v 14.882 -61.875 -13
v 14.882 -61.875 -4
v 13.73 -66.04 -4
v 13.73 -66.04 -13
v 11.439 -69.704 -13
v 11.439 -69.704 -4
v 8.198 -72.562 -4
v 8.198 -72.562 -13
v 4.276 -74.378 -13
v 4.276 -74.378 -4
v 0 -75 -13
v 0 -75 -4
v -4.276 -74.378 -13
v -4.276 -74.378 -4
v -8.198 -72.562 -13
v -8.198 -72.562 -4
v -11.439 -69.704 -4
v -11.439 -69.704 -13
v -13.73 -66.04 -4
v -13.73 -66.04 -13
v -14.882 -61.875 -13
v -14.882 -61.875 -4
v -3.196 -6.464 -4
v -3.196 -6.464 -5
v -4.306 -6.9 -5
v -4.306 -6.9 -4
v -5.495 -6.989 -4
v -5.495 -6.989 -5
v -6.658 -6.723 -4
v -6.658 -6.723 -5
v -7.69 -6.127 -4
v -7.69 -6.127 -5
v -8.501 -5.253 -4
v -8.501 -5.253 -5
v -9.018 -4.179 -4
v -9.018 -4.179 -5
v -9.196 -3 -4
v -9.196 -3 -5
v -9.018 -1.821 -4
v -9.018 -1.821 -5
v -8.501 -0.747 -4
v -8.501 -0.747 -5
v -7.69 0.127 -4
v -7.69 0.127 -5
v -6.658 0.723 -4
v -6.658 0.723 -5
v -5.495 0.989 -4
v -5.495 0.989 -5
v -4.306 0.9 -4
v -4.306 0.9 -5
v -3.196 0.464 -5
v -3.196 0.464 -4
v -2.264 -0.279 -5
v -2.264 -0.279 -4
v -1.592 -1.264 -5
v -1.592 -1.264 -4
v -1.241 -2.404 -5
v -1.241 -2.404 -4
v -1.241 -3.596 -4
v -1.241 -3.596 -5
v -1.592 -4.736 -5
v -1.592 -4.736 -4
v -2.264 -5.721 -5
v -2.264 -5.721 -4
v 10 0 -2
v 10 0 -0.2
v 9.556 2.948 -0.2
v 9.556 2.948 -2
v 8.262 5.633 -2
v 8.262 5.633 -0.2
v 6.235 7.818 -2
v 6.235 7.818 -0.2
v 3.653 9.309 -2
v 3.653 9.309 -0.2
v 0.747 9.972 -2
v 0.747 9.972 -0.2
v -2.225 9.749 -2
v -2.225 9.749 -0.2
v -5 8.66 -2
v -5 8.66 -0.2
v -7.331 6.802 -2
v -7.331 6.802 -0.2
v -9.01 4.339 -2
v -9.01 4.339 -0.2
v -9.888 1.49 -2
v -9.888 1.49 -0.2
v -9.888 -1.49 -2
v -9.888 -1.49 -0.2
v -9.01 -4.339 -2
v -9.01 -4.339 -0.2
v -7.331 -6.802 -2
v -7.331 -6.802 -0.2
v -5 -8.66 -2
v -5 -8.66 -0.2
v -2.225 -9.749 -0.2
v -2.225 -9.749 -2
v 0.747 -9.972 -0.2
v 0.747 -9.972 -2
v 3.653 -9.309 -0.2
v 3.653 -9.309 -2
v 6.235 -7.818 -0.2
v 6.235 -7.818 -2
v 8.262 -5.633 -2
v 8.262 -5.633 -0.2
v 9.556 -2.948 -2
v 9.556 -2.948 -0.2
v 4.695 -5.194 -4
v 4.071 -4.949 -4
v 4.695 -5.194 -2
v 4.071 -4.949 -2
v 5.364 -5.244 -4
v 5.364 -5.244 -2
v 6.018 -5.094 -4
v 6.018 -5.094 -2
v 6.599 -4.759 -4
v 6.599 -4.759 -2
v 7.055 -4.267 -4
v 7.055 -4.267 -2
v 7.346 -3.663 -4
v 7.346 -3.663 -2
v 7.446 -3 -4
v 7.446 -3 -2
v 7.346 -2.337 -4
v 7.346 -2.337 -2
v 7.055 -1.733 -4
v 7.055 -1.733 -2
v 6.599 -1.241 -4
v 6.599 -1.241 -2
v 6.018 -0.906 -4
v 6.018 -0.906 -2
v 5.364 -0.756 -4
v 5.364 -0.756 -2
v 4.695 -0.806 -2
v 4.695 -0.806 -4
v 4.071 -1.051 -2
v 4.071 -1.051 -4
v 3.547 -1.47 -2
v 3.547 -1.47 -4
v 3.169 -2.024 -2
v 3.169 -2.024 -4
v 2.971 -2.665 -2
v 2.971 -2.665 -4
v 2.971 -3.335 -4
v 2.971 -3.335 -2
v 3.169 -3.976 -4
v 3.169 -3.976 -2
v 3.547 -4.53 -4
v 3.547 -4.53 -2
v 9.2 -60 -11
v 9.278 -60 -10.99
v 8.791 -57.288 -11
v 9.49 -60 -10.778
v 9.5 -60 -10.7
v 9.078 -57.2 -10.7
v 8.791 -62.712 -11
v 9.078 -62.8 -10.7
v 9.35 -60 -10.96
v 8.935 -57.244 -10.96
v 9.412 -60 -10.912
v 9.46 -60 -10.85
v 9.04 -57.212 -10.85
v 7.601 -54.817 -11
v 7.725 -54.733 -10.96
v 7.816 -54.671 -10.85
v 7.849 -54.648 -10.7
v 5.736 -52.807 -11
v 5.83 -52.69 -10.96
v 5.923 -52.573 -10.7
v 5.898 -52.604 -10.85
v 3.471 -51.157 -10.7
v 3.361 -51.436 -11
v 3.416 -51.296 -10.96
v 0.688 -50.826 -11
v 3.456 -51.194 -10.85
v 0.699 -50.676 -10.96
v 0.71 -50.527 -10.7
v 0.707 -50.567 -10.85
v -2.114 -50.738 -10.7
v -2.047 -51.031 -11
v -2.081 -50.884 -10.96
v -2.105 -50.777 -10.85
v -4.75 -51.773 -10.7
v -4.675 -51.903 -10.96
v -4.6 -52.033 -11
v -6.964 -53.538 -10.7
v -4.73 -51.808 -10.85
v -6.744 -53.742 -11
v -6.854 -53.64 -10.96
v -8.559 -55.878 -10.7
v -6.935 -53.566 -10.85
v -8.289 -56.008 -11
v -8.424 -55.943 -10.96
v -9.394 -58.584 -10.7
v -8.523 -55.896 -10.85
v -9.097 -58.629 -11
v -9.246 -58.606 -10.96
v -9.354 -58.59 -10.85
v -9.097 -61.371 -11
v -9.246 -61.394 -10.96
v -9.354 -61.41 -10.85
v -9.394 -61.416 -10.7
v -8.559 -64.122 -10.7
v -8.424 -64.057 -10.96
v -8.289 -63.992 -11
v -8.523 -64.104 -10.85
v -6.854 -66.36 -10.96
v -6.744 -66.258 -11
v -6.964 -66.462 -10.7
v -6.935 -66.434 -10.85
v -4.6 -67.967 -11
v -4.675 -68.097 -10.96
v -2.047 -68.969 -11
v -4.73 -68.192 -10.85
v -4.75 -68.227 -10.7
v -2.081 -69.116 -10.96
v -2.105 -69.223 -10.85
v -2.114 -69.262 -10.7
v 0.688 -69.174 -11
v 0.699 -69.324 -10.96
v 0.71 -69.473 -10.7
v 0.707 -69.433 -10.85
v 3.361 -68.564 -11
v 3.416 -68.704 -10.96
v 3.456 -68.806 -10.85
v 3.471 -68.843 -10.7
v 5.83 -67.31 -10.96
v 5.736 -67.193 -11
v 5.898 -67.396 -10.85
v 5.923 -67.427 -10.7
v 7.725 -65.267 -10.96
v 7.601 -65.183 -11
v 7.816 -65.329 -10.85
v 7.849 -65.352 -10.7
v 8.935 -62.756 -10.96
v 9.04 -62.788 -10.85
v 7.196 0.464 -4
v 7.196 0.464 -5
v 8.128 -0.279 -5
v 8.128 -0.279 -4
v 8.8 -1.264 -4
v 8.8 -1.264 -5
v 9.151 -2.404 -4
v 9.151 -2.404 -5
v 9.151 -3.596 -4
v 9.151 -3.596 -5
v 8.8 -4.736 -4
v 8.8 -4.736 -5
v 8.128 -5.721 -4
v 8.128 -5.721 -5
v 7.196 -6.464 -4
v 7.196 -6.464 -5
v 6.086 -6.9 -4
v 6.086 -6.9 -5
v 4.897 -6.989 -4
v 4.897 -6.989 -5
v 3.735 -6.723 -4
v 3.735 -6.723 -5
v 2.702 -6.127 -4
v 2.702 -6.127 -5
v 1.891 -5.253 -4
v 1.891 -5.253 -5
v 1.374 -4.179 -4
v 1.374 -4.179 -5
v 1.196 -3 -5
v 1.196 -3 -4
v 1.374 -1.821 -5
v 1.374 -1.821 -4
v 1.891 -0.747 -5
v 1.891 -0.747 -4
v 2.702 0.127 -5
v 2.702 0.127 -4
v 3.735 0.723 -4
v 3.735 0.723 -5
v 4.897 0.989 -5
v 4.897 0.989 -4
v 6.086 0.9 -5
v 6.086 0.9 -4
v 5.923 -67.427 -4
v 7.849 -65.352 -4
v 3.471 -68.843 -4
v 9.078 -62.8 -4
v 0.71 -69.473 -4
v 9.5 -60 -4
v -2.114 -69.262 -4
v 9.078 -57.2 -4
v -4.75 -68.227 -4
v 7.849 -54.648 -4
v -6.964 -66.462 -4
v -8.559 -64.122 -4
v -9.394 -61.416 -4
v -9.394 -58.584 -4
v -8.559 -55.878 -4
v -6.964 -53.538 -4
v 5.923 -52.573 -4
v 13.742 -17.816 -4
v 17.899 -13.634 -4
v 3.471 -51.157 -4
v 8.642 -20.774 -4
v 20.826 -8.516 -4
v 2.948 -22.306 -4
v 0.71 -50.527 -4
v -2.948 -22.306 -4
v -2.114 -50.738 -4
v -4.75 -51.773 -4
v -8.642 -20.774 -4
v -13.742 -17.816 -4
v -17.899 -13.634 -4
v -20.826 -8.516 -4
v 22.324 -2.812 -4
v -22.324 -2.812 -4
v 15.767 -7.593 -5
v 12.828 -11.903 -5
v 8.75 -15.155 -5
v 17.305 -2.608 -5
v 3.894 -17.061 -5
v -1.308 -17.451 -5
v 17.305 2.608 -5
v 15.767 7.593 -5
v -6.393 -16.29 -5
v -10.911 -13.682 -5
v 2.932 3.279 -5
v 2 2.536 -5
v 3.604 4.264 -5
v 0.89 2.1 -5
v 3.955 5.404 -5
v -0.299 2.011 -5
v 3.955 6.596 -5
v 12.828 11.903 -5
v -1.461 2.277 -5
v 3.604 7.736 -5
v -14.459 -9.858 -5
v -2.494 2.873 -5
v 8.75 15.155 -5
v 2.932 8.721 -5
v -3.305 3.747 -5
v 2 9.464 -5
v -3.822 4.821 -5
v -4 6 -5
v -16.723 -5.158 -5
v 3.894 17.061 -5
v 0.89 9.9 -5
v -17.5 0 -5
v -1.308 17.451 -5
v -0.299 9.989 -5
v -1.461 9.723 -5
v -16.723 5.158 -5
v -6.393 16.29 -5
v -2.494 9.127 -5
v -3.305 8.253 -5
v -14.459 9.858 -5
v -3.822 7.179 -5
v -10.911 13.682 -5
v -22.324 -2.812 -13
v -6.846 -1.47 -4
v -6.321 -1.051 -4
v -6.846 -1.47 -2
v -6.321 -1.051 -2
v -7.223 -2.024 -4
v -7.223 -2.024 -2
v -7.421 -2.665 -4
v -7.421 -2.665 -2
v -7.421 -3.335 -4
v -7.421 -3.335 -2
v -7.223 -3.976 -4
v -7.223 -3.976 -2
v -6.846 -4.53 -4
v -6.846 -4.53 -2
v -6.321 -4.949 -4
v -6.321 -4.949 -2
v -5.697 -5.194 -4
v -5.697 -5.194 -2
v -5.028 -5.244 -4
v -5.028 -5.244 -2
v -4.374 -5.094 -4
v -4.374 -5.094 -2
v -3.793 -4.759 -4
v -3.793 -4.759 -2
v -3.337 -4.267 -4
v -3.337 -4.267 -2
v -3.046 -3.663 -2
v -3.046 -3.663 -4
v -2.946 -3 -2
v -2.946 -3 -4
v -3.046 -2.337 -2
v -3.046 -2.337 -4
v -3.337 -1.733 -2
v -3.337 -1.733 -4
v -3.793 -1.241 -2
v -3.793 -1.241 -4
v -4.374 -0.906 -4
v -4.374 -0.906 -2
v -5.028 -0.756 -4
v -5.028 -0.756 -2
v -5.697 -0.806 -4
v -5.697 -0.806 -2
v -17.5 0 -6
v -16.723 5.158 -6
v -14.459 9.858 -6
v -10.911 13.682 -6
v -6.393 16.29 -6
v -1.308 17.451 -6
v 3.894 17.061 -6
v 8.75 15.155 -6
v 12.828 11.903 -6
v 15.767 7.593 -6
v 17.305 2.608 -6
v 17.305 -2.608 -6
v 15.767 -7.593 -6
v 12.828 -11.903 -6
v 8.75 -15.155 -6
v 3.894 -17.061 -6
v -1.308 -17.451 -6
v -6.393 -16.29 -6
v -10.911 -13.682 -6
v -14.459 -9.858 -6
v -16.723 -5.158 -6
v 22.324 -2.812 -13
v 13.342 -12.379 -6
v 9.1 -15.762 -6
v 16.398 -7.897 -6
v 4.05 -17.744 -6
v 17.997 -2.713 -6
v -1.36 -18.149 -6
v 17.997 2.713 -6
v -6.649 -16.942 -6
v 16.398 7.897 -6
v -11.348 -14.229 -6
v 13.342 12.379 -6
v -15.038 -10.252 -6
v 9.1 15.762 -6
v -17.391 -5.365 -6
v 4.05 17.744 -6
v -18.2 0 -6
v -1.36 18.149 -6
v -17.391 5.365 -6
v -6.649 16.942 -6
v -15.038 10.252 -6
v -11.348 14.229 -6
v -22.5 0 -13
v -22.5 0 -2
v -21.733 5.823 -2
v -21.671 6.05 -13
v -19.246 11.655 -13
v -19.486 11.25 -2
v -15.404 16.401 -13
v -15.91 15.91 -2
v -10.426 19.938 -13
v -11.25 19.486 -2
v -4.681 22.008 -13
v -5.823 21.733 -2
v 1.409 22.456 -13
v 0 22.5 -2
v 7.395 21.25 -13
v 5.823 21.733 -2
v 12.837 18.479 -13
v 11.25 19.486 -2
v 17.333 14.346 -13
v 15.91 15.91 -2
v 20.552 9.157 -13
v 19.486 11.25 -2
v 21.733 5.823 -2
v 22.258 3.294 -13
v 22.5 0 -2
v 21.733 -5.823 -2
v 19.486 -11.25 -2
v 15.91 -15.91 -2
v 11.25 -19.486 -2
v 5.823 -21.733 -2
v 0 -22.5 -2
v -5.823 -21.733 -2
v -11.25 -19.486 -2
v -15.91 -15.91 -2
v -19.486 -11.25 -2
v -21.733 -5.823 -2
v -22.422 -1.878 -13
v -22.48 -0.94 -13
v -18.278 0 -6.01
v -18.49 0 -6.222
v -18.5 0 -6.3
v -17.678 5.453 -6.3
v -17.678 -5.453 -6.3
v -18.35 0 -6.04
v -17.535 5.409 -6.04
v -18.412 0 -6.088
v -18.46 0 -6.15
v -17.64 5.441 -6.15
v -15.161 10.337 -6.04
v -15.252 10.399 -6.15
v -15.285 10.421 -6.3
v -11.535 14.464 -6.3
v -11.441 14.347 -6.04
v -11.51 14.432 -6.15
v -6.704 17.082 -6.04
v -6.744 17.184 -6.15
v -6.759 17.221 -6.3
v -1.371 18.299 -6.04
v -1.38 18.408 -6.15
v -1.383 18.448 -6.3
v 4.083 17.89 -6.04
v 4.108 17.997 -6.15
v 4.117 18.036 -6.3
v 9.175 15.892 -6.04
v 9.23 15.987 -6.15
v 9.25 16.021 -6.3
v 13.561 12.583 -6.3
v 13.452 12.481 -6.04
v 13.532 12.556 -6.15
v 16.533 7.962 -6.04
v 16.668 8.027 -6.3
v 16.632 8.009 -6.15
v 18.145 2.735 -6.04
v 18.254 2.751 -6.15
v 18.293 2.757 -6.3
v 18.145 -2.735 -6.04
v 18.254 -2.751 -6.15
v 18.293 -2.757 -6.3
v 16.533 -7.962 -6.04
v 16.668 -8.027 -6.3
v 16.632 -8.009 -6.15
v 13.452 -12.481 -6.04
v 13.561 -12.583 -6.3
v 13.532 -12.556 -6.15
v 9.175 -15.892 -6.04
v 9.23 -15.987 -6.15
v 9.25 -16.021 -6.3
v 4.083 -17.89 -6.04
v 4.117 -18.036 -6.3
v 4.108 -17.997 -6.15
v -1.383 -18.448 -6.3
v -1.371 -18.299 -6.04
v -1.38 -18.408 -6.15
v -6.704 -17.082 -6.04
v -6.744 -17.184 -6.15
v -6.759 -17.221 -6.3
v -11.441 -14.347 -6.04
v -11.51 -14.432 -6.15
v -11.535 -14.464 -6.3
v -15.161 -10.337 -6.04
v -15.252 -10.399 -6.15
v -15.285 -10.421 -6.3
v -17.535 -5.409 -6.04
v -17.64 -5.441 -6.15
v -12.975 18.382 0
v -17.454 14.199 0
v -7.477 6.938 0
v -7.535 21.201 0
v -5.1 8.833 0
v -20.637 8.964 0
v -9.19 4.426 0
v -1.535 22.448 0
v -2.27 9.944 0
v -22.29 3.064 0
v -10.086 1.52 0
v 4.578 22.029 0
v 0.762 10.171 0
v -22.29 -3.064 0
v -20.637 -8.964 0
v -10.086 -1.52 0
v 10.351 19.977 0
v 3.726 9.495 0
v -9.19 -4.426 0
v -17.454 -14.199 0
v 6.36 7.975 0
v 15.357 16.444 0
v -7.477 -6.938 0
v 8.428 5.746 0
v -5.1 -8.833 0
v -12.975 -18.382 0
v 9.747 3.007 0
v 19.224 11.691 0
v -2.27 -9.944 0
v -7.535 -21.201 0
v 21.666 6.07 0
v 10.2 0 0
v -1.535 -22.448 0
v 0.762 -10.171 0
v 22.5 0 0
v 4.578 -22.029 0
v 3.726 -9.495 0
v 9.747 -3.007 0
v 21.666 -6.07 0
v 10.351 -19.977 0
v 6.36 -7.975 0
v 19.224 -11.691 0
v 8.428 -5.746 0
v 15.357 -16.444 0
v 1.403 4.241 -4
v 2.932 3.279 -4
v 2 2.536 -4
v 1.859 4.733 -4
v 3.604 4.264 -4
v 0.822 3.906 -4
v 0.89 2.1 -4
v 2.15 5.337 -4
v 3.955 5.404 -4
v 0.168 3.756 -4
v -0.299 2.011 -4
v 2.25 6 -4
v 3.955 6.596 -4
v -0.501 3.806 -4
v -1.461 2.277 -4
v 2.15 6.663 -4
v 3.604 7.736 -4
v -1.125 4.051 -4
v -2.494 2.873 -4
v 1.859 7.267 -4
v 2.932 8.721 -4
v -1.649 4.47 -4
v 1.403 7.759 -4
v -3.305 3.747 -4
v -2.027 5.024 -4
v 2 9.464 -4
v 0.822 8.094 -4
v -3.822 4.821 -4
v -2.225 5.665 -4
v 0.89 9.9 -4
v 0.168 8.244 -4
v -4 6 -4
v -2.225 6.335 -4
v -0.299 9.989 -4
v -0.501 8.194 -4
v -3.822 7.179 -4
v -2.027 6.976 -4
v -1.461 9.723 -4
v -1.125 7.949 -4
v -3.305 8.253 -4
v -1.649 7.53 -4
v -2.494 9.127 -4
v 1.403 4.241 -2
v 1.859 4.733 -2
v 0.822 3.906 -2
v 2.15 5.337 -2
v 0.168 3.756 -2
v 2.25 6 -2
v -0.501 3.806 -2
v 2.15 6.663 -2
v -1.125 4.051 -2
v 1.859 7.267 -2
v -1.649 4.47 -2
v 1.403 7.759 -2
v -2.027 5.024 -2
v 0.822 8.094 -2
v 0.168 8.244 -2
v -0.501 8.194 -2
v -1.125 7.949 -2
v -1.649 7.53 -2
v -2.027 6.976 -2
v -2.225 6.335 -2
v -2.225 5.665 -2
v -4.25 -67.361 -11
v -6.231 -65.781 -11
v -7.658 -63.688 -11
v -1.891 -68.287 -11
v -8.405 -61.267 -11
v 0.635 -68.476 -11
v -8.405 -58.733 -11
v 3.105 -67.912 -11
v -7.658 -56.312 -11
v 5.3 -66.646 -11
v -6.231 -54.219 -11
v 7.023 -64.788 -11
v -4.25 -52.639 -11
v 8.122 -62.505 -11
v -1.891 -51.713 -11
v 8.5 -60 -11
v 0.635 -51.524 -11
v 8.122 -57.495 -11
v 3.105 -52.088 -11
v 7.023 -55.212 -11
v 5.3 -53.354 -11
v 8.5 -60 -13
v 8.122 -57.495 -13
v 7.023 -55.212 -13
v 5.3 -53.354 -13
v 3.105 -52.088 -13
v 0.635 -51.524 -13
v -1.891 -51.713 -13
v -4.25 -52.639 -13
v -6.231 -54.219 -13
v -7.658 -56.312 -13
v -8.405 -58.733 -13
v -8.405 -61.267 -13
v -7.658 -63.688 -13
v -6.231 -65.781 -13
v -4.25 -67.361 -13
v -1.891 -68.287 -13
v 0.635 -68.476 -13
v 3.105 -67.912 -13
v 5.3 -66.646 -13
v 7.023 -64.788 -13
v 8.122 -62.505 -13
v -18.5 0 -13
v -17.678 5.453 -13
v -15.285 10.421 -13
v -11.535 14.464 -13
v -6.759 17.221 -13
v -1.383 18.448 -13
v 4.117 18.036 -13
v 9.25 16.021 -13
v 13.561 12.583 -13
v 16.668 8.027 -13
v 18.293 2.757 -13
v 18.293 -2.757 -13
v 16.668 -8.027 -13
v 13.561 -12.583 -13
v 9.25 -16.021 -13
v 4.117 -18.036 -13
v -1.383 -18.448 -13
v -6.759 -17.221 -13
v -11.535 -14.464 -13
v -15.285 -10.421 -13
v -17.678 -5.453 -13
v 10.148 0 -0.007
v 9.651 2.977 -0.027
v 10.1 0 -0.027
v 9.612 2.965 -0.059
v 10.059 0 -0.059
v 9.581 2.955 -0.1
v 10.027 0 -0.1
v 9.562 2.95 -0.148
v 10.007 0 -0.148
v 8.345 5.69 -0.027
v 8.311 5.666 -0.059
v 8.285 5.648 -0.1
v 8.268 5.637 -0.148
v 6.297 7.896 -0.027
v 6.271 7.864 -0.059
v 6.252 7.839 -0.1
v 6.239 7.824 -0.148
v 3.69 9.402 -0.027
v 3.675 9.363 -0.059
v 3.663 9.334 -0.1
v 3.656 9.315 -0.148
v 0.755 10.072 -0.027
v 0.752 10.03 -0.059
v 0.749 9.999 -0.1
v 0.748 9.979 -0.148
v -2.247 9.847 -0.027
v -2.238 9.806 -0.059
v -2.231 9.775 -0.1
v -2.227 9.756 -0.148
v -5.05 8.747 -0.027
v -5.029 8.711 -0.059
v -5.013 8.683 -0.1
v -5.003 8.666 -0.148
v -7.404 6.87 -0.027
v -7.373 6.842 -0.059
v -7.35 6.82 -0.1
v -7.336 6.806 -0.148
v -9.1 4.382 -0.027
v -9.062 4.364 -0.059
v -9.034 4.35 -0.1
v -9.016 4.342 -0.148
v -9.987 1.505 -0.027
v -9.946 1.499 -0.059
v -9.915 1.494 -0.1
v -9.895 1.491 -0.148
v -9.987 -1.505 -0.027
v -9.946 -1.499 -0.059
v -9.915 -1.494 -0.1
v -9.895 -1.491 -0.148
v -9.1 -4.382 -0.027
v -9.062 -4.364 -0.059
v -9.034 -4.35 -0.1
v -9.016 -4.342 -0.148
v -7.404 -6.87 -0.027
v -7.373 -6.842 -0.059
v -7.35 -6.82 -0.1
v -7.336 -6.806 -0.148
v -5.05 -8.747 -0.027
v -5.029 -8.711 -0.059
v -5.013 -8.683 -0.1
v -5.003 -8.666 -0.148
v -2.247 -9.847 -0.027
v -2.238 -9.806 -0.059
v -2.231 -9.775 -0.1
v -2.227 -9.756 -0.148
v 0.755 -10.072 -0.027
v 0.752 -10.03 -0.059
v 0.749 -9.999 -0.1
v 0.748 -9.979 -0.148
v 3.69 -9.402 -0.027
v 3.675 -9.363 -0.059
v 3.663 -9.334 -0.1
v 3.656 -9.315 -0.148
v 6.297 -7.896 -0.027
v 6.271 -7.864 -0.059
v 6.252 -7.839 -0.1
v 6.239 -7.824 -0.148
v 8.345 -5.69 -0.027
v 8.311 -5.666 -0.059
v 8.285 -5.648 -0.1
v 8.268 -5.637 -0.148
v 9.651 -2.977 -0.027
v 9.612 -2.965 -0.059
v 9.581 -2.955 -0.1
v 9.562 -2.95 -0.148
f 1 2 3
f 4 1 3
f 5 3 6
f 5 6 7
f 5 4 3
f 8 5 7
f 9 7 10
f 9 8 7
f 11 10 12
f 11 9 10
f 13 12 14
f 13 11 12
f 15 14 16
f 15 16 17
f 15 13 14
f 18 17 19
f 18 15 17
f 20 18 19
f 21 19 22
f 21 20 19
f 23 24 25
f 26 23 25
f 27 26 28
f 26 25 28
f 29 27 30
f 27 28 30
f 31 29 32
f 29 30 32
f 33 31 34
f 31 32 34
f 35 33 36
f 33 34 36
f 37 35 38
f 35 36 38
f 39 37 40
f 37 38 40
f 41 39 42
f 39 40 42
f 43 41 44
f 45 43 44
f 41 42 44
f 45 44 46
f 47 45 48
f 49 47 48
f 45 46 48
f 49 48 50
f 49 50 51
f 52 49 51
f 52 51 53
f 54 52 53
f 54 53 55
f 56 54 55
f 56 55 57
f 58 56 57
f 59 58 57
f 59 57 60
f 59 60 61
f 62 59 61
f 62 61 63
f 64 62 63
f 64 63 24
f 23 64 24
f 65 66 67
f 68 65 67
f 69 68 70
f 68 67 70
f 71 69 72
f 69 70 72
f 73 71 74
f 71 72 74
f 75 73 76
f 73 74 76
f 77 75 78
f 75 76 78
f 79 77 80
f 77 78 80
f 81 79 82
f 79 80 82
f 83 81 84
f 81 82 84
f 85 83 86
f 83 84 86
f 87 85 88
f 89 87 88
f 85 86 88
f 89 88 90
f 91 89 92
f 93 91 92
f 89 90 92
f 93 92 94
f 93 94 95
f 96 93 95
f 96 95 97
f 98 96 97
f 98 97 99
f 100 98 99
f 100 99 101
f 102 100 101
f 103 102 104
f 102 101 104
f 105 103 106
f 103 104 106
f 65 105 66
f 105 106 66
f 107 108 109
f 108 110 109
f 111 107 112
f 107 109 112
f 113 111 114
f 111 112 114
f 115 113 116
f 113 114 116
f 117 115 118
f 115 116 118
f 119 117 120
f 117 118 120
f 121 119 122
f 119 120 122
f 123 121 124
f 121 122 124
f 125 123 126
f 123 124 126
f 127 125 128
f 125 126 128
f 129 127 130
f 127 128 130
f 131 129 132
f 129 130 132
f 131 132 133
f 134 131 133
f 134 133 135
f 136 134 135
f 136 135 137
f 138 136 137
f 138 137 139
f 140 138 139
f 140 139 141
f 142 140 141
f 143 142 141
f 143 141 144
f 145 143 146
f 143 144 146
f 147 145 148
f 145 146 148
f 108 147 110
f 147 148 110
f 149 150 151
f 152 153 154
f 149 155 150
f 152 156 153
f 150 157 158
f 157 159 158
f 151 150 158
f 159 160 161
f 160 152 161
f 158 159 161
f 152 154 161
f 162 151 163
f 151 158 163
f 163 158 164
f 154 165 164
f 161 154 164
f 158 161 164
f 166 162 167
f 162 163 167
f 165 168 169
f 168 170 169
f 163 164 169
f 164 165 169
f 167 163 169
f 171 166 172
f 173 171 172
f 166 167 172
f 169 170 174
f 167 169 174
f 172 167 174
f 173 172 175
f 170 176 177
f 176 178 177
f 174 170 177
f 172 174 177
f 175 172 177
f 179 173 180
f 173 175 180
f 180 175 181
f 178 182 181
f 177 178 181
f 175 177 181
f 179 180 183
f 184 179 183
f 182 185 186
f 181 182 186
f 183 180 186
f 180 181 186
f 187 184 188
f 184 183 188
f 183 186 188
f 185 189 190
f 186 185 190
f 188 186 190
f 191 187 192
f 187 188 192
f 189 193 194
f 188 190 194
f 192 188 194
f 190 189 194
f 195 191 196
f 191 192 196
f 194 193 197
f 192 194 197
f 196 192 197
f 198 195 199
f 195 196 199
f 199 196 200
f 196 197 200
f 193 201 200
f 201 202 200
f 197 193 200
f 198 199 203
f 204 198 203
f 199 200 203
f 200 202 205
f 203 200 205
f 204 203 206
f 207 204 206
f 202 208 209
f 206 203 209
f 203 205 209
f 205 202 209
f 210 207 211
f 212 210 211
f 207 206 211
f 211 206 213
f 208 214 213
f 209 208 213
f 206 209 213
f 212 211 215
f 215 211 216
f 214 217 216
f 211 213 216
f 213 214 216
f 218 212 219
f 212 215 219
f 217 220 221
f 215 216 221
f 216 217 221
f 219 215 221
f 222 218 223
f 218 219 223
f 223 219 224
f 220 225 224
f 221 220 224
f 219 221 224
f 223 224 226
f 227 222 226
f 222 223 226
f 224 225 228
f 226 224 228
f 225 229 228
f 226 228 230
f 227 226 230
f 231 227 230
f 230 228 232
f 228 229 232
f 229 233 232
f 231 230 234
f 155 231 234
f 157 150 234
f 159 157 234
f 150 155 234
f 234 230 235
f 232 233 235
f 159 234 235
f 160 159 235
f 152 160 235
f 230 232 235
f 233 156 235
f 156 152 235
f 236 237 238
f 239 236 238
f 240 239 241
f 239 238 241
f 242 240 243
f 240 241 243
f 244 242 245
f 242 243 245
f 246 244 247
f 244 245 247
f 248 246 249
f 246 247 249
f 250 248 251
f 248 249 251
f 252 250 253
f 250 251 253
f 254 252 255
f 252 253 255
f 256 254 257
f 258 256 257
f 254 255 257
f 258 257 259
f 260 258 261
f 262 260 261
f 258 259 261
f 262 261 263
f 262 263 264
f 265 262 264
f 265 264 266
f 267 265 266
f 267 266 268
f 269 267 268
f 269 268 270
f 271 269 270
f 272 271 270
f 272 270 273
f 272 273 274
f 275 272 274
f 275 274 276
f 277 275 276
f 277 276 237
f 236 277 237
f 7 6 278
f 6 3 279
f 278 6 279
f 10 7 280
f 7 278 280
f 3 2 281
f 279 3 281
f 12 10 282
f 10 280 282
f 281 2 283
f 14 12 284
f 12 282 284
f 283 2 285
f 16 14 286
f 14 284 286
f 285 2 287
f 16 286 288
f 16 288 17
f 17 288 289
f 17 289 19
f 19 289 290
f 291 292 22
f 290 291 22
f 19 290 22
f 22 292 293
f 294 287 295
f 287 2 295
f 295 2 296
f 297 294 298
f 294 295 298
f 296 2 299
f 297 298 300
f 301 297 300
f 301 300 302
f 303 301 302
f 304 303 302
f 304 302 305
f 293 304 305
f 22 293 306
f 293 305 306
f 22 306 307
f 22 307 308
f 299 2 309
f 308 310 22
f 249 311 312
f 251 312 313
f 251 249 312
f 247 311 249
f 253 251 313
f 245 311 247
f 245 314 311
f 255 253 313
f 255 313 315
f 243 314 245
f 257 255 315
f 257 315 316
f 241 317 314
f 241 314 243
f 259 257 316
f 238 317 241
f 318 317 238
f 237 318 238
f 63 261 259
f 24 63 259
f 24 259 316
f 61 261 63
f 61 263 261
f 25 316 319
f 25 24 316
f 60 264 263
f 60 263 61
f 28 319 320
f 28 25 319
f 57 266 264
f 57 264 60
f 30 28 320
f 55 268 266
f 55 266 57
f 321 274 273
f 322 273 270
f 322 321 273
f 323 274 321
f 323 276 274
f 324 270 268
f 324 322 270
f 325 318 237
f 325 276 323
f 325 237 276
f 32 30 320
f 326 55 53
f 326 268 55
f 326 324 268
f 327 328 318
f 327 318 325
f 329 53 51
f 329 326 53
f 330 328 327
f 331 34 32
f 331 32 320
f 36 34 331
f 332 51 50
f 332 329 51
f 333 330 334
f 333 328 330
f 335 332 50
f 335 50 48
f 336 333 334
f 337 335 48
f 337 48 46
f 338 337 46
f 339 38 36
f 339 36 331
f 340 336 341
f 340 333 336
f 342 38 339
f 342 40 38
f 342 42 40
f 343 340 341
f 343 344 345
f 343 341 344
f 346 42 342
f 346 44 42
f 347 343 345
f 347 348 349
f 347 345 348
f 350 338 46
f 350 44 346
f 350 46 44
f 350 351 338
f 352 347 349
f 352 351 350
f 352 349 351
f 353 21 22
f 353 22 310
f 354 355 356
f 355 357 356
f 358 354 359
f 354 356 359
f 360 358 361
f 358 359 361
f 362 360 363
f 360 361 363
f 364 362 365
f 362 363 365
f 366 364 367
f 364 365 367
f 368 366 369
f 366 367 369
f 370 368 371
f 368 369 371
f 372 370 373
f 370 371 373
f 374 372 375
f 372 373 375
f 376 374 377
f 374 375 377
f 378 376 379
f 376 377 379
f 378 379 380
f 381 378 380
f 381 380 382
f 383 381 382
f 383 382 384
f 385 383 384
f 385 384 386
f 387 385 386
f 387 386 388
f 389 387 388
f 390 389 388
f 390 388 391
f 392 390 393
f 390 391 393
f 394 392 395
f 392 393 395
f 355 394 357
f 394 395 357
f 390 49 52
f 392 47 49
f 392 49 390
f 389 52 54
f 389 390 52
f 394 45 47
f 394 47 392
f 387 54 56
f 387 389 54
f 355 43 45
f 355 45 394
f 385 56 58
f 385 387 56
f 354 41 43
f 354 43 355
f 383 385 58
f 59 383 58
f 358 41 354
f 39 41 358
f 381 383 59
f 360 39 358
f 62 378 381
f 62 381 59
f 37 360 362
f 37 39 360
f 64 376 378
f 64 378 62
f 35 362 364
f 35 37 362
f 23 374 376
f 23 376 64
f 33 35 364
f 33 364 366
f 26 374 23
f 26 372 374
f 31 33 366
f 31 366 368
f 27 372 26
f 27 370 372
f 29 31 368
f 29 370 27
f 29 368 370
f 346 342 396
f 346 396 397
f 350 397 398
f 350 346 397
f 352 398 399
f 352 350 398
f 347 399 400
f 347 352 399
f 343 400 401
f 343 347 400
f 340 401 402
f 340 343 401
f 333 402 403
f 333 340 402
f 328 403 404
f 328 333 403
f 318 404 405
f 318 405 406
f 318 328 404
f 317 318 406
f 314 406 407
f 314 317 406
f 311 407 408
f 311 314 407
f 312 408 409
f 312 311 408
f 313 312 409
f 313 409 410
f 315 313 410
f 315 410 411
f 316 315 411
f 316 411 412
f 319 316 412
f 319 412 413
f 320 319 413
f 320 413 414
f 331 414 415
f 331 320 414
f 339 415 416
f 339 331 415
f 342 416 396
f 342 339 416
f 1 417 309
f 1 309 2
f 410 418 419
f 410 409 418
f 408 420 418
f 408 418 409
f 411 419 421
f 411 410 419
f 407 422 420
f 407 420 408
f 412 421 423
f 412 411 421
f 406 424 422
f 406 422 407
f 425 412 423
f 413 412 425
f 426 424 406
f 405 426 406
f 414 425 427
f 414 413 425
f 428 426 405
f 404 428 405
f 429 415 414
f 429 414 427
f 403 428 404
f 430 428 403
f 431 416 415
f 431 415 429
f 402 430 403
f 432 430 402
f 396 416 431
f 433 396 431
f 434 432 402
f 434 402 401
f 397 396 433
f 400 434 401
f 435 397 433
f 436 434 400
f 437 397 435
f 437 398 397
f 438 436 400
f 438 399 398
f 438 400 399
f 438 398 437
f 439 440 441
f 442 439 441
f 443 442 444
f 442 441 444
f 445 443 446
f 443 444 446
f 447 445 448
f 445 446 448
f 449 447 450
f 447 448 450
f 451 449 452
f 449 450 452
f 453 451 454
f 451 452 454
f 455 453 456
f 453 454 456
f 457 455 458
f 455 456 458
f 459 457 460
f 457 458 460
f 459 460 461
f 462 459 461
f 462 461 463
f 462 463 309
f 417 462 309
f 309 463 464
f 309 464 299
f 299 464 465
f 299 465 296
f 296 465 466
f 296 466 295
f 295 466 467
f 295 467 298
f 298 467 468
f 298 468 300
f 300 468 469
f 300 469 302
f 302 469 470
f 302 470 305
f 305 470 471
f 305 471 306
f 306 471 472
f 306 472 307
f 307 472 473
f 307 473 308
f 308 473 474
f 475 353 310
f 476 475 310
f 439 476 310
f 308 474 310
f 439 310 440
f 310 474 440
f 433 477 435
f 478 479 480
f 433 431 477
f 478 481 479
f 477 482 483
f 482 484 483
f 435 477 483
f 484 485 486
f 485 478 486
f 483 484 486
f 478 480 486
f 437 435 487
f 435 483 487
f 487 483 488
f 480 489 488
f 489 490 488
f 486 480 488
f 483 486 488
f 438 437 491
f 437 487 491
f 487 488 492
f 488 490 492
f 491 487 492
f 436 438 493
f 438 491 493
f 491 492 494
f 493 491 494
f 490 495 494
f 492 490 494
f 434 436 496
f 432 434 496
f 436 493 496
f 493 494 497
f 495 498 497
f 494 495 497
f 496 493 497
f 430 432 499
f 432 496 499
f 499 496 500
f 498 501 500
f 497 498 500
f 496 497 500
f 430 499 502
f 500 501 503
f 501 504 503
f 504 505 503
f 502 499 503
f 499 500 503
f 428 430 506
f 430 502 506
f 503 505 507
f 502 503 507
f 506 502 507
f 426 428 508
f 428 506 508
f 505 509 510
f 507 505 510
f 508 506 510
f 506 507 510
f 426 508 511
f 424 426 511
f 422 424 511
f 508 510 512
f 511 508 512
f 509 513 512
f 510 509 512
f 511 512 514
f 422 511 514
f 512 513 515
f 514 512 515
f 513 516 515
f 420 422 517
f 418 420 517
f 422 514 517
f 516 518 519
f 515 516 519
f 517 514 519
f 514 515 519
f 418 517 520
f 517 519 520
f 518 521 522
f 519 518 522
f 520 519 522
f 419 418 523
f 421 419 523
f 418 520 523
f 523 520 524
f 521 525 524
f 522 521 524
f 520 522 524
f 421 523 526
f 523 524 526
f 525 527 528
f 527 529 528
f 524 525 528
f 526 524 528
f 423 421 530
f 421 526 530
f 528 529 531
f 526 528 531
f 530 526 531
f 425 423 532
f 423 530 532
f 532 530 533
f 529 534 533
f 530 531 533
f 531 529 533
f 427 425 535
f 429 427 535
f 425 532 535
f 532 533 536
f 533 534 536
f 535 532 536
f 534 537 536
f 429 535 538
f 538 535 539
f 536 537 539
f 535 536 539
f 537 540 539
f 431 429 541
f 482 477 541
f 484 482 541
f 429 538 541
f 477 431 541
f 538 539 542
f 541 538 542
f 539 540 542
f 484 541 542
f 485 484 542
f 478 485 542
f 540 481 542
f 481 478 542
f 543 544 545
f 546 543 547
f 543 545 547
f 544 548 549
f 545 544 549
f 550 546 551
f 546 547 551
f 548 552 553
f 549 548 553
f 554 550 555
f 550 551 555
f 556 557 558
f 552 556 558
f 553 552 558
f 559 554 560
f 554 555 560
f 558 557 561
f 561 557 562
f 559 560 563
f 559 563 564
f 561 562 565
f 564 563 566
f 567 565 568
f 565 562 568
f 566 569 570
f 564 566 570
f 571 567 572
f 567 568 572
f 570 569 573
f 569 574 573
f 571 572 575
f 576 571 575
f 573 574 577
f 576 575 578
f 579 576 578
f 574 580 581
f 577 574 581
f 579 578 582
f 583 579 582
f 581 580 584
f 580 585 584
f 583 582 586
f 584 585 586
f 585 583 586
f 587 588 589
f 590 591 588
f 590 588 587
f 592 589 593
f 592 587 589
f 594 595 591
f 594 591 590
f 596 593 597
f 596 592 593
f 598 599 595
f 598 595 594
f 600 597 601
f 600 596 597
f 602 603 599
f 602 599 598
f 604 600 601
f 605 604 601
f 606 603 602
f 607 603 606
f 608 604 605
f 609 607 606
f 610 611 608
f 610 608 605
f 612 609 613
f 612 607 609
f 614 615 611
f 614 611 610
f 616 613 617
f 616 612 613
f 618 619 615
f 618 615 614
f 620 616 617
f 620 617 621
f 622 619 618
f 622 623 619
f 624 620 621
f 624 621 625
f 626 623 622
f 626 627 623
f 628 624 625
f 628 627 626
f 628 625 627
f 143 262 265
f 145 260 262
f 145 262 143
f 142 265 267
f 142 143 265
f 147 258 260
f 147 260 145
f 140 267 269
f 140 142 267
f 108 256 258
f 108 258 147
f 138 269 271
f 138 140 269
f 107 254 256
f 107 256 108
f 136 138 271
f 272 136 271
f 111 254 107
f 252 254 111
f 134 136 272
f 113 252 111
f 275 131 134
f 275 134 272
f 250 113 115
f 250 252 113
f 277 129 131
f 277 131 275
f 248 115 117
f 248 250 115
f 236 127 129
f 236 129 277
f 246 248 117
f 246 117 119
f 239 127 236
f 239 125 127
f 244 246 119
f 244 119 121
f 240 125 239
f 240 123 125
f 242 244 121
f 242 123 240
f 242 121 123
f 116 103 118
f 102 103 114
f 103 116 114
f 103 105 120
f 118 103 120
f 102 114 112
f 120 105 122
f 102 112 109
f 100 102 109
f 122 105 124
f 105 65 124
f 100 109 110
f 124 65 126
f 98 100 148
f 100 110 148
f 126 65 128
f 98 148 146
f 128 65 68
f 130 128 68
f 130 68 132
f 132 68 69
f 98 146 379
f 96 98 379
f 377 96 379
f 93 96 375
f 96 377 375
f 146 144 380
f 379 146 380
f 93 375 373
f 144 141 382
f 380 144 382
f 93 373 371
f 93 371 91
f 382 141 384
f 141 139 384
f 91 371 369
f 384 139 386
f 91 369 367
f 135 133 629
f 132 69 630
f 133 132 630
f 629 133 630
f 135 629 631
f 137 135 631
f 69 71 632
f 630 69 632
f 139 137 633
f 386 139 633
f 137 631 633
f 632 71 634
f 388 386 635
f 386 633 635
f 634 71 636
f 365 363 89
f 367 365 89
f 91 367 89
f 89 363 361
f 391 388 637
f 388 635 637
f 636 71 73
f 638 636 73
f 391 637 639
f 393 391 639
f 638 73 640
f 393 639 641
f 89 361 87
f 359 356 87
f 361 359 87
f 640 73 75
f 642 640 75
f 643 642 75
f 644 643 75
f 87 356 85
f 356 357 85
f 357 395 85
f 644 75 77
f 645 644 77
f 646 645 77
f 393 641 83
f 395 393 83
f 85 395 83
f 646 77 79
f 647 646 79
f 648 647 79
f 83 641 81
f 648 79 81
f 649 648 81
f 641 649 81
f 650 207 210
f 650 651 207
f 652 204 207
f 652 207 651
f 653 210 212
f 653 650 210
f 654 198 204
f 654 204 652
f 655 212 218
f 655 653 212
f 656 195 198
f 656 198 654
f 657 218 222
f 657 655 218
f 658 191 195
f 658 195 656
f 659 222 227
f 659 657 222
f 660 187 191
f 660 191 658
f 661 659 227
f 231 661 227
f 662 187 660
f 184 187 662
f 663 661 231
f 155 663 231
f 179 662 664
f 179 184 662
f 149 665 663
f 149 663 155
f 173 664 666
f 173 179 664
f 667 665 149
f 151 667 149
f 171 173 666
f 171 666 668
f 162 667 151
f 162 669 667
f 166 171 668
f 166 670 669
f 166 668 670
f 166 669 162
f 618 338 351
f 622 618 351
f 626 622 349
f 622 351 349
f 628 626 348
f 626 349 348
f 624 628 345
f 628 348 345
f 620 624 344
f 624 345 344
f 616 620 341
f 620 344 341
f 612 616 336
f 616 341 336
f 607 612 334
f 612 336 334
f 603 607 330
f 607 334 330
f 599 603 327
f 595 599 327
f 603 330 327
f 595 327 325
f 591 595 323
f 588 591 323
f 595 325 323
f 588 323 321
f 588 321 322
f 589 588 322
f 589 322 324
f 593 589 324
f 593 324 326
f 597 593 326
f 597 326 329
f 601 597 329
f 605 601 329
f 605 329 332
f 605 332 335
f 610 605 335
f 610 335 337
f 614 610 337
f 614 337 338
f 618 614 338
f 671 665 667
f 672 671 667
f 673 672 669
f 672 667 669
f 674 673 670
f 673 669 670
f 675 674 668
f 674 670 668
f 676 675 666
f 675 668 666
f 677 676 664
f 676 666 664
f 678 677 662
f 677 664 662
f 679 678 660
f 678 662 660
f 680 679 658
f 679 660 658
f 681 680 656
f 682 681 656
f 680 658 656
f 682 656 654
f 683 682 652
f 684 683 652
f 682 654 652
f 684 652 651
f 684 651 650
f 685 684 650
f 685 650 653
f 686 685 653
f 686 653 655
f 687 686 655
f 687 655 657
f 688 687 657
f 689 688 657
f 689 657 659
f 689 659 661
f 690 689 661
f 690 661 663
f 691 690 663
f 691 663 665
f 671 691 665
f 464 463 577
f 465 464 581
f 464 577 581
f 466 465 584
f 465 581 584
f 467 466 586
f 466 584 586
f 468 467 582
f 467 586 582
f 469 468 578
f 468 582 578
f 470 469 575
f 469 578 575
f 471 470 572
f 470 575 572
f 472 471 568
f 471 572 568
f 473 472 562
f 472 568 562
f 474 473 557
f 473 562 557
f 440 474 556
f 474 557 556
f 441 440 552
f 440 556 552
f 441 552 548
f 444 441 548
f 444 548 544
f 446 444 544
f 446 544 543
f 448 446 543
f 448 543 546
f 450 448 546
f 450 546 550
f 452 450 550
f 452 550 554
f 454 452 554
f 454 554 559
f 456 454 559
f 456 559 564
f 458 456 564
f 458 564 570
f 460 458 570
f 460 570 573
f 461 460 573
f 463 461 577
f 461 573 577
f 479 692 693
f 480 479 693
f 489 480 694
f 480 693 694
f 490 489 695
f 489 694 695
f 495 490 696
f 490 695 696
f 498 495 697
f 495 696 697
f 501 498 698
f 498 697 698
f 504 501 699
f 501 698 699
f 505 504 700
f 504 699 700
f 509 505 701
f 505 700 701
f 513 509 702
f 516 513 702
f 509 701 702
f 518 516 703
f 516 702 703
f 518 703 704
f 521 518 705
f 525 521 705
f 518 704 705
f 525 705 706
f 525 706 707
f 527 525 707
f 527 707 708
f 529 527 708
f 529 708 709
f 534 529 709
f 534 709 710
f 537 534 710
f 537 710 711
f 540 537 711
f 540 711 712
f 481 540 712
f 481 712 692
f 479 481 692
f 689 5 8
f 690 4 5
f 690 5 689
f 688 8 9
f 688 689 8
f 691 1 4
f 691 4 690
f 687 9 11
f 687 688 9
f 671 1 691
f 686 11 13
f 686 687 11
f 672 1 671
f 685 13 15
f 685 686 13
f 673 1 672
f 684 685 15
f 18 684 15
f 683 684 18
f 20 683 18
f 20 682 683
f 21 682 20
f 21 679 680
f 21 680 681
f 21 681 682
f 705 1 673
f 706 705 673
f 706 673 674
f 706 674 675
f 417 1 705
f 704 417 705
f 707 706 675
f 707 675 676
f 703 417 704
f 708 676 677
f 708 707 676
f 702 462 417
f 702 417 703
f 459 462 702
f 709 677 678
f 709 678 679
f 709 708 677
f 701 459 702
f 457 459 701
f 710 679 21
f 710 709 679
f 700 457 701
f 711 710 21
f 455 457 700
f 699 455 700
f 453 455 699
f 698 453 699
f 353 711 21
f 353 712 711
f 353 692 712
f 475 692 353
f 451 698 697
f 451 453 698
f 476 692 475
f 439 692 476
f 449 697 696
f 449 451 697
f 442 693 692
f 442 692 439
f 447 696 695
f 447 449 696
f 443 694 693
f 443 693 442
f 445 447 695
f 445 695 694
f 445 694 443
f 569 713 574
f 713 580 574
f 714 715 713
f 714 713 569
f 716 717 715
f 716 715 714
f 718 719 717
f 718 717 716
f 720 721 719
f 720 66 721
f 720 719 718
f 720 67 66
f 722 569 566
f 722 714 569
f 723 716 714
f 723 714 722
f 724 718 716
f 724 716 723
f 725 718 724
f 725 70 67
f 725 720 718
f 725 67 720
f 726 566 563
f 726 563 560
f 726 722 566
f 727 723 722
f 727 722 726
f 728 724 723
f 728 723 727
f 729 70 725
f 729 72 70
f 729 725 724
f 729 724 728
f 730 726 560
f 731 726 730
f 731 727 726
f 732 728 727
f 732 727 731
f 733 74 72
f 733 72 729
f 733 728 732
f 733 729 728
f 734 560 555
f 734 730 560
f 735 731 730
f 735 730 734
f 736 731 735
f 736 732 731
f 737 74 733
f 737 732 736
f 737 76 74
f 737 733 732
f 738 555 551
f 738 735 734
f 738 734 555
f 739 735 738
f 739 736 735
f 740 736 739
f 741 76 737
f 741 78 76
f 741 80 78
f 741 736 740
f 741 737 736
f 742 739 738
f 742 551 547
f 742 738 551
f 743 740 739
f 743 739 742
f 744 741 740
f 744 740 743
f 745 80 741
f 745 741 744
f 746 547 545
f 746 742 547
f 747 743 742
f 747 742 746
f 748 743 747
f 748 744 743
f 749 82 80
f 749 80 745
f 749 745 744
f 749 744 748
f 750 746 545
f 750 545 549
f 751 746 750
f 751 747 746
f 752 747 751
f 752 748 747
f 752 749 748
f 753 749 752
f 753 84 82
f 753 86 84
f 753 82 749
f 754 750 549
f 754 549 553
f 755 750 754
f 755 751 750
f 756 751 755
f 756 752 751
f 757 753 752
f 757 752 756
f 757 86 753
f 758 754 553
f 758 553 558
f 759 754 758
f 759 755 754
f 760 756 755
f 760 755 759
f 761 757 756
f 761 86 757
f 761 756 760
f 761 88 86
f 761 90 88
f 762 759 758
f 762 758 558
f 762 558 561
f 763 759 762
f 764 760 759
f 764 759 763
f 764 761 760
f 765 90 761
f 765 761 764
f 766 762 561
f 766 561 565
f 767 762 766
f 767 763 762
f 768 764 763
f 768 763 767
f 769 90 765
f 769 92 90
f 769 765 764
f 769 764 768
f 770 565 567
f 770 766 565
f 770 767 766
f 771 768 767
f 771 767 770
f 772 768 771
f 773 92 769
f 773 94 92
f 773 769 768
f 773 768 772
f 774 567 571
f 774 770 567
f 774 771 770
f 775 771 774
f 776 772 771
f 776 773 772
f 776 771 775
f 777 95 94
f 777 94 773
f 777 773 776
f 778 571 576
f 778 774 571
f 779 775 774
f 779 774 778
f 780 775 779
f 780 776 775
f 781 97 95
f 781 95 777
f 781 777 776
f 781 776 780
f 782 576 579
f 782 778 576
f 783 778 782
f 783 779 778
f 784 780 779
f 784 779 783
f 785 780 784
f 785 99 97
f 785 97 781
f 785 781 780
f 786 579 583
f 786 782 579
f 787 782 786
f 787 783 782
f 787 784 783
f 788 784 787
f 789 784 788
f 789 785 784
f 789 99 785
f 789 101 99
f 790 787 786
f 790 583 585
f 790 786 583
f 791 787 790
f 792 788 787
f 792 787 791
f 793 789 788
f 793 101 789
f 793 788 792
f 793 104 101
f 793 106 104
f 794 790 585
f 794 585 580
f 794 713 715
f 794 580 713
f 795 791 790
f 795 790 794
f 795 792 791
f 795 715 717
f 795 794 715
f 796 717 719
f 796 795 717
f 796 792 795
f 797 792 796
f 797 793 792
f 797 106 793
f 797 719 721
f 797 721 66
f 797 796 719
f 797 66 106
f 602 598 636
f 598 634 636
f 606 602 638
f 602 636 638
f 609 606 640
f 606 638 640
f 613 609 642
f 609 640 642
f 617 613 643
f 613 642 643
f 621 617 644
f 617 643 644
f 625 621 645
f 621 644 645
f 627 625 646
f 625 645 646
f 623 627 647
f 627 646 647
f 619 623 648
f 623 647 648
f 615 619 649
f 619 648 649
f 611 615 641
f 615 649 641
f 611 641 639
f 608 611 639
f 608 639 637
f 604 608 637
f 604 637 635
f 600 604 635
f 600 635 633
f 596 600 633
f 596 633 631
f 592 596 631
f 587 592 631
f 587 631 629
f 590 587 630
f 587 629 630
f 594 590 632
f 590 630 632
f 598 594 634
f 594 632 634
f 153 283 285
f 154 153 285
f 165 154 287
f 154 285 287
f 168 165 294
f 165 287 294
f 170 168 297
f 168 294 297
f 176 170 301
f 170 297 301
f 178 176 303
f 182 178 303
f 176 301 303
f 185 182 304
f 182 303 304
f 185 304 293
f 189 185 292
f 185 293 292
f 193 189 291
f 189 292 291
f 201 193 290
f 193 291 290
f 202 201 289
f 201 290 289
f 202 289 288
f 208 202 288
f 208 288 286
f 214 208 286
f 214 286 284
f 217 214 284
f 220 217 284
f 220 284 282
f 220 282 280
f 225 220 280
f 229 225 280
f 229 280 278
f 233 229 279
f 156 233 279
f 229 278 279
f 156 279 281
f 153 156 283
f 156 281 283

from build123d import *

# Parameters (mm, degrees)
SKETCH_2_R                   = 22.5
EXTRUDE_2_DEPTH              = 2
SKETCH_22_R                  = 10
CUT_EXTRUDE_1_DEPTH          = 2
FILLET_4_R                   = 0.2
SKETCH_54_R                  = 22.5
EXTRUDE_6_DEPTH              = 11
SKETCH_55_R                  = 18.5
CUT_EXTRUDE_2_DEPTH          = 8
HOLE_WIZARD_M4_1_D           = 4.5
HOLE_WIZARD_M4_1_CBORE_D     = 8
HOLE_WIZARD_M4_1_CBORE_DEPTH = 1
PATTERN_CIRCULAR_1_COUNT     = 3
SKETCH_59_R                  = 18.5
SKETCH_59_R_2                = 17.5
EXTRUDE_7_DEPTH              = 1
EXTRUDE_8_DEPTH              = 9
FILLET_6_R                   = 0.3
SKETCH_68_R                  = 9.5
CUT_EXTRUDE_7_DEPTH          = 7
SKETCH_69_R                  = 8.5
CUT_EXTRUDE_8_DEPTH          = 3
FILLET_7_R                   = 0.3


with BuildPart() as part:
    # 스케치2 → 보스-돌출2 (new body)
    with BuildSketch(Plane(origin=(0, 6, 0), x_dir=(1, 0, 0), z_dir=(0, 0, -1))):
        with Locations((0, 6)):
            Circle(SKETCH_2_R)
    extrude(amount=EXTRUDE_2_DEPTH)

    # 스케치22 → 컷-돌출1 (cut)
    with BuildSketch(Plane.XY):
        Circle(SKETCH_22_R)
    extrude(amount=-CUT_EXTRUDE_1_DEPTH, mode=Mode.SUBTRACT)

    # 필렛4
    fillet_4_edges = [part.edges().sort_by_distance(p)[0] for p in [
        (-10, 0, 0),
    ]]
    fillet(fillet_4_edges, radius=FILLET_4_R)

    # 스케치54 → 보스-돌출6 (add)
    with BuildSketch(Plane(origin=(0, 0, -2), x_dir=(-1, 0, 0), z_dir=(0, 0, -1))):
        Circle(SKETCH_54_R)
    extrude(amount=EXTRUDE_6_DEPTH)

    # 스케치55 → 컷-돌출2 (cut)
    with BuildSketch(Plane(origin=(0, 0, -13), x_dir=(-1, 0, 0), z_dir=(0, 0, -1))):
        Circle(SKETCH_55_R)
    extrude(amount=-CUT_EXTRUDE_2_DEPTH, mode=Mode.SUBTRACT)

    # M4 육각 소켓 머리 캡 나사용 카운터보어1 (through all)
    with Locations(Plane(origin=(0, 0, -5), x_dir=(-1, 0, 0), z_dir=(0, 0, -1))):
        with Locations((0, 6)):
            hole_wizard_m4_1 = CounterBoreHole(HOLE_WIZARD_M4_1_D / 2, HOLE_WIZARD_M4_1_CBORE_D / 2, HOLE_WIZARD_M4_1_CBORE_DEPTH)

    # 원형 패턴1: M4 육각 소켓 머리 캡 나사용 카운터보어1 ×3 about axis
    pattern_circular_1_axis = Axis((0, 0, 0), (0, 0, 1))
    for i in range(1, PATTERN_CIRCULAR_1_COUNT):
        add(hole_wizard_m4_1.rotate(pattern_circular_1_axis, i * 360 / PATTERN_CIRCULAR_1_COUNT), mode=Mode.SUBTRACT)

    # 스케치59 → 보스-돌출7 (add)
    with BuildSketch(Plane(origin=(0, 0, -5), x_dir=(-1, 0, 0), z_dir=(0, 0, -1))):
        Circle(SKETCH_59_R)
        Circle(SKETCH_59_R_2, mode=Mode.SUBTRACT)
    extrude(amount=EXTRUDE_7_DEPTH)

    # 스케치60 → 보스-돌출8 (add)
    with BuildSketch(Plane(origin=(0, 0, -13), x_dir=(-1, 0, 0), z_dir=(0, 0, -1))):
        with BuildLine():
            Line((-22.323526687, -2.8125), (-14.882351125, -61.875))
            ThreePointArc((-14.882351125, -61.875), (0, -75), (14.882351125, -61.875))
            Line((14.882351125, -61.875), (22.323526687, -2.8125))
            ThreePointArc((22.323526687, -2.8125), (0, -22.5), (-22.323526687, -2.8125))
        make_face()
    extrude(amount=-EXTRUDE_8_DEPTH)

    # 필렛6
    fillet_6_edges = [part.edges().sort_by_distance(p)[0] for p in [
        (18.5, 0, -6),
    ]]
    fillet(fillet_6_edges, radius=FILLET_6_R)

    # 스케치68 → 컷-돌출7 (cut)
    with BuildSketch(Plane.XY.offset(-4)):
        with Locations((0, -60)):
            Circle(SKETCH_68_R)
    extrude(amount=-CUT_EXTRUDE_7_DEPTH, mode=Mode.SUBTRACT)

    # 스케치69 → 컷-돌출8 (cut, through all)
    with BuildSketch(Plane.XY.offset(-11)):
        with Locations((0, -60)):
            Circle(SKETCH_69_R)
    extrude(amount=-CUT_EXTRUDE_8_DEPTH, mode=Mode.SUBTRACT)

    # 필렛7
    fillet_7_edges = [part.edges().sort_by_distance(p)[0] for p in [
        (-9.5, -60, -11),
    ]]
    fillet(fillet_7_edges, radius=FILLET_7_R)


solid = part.part
